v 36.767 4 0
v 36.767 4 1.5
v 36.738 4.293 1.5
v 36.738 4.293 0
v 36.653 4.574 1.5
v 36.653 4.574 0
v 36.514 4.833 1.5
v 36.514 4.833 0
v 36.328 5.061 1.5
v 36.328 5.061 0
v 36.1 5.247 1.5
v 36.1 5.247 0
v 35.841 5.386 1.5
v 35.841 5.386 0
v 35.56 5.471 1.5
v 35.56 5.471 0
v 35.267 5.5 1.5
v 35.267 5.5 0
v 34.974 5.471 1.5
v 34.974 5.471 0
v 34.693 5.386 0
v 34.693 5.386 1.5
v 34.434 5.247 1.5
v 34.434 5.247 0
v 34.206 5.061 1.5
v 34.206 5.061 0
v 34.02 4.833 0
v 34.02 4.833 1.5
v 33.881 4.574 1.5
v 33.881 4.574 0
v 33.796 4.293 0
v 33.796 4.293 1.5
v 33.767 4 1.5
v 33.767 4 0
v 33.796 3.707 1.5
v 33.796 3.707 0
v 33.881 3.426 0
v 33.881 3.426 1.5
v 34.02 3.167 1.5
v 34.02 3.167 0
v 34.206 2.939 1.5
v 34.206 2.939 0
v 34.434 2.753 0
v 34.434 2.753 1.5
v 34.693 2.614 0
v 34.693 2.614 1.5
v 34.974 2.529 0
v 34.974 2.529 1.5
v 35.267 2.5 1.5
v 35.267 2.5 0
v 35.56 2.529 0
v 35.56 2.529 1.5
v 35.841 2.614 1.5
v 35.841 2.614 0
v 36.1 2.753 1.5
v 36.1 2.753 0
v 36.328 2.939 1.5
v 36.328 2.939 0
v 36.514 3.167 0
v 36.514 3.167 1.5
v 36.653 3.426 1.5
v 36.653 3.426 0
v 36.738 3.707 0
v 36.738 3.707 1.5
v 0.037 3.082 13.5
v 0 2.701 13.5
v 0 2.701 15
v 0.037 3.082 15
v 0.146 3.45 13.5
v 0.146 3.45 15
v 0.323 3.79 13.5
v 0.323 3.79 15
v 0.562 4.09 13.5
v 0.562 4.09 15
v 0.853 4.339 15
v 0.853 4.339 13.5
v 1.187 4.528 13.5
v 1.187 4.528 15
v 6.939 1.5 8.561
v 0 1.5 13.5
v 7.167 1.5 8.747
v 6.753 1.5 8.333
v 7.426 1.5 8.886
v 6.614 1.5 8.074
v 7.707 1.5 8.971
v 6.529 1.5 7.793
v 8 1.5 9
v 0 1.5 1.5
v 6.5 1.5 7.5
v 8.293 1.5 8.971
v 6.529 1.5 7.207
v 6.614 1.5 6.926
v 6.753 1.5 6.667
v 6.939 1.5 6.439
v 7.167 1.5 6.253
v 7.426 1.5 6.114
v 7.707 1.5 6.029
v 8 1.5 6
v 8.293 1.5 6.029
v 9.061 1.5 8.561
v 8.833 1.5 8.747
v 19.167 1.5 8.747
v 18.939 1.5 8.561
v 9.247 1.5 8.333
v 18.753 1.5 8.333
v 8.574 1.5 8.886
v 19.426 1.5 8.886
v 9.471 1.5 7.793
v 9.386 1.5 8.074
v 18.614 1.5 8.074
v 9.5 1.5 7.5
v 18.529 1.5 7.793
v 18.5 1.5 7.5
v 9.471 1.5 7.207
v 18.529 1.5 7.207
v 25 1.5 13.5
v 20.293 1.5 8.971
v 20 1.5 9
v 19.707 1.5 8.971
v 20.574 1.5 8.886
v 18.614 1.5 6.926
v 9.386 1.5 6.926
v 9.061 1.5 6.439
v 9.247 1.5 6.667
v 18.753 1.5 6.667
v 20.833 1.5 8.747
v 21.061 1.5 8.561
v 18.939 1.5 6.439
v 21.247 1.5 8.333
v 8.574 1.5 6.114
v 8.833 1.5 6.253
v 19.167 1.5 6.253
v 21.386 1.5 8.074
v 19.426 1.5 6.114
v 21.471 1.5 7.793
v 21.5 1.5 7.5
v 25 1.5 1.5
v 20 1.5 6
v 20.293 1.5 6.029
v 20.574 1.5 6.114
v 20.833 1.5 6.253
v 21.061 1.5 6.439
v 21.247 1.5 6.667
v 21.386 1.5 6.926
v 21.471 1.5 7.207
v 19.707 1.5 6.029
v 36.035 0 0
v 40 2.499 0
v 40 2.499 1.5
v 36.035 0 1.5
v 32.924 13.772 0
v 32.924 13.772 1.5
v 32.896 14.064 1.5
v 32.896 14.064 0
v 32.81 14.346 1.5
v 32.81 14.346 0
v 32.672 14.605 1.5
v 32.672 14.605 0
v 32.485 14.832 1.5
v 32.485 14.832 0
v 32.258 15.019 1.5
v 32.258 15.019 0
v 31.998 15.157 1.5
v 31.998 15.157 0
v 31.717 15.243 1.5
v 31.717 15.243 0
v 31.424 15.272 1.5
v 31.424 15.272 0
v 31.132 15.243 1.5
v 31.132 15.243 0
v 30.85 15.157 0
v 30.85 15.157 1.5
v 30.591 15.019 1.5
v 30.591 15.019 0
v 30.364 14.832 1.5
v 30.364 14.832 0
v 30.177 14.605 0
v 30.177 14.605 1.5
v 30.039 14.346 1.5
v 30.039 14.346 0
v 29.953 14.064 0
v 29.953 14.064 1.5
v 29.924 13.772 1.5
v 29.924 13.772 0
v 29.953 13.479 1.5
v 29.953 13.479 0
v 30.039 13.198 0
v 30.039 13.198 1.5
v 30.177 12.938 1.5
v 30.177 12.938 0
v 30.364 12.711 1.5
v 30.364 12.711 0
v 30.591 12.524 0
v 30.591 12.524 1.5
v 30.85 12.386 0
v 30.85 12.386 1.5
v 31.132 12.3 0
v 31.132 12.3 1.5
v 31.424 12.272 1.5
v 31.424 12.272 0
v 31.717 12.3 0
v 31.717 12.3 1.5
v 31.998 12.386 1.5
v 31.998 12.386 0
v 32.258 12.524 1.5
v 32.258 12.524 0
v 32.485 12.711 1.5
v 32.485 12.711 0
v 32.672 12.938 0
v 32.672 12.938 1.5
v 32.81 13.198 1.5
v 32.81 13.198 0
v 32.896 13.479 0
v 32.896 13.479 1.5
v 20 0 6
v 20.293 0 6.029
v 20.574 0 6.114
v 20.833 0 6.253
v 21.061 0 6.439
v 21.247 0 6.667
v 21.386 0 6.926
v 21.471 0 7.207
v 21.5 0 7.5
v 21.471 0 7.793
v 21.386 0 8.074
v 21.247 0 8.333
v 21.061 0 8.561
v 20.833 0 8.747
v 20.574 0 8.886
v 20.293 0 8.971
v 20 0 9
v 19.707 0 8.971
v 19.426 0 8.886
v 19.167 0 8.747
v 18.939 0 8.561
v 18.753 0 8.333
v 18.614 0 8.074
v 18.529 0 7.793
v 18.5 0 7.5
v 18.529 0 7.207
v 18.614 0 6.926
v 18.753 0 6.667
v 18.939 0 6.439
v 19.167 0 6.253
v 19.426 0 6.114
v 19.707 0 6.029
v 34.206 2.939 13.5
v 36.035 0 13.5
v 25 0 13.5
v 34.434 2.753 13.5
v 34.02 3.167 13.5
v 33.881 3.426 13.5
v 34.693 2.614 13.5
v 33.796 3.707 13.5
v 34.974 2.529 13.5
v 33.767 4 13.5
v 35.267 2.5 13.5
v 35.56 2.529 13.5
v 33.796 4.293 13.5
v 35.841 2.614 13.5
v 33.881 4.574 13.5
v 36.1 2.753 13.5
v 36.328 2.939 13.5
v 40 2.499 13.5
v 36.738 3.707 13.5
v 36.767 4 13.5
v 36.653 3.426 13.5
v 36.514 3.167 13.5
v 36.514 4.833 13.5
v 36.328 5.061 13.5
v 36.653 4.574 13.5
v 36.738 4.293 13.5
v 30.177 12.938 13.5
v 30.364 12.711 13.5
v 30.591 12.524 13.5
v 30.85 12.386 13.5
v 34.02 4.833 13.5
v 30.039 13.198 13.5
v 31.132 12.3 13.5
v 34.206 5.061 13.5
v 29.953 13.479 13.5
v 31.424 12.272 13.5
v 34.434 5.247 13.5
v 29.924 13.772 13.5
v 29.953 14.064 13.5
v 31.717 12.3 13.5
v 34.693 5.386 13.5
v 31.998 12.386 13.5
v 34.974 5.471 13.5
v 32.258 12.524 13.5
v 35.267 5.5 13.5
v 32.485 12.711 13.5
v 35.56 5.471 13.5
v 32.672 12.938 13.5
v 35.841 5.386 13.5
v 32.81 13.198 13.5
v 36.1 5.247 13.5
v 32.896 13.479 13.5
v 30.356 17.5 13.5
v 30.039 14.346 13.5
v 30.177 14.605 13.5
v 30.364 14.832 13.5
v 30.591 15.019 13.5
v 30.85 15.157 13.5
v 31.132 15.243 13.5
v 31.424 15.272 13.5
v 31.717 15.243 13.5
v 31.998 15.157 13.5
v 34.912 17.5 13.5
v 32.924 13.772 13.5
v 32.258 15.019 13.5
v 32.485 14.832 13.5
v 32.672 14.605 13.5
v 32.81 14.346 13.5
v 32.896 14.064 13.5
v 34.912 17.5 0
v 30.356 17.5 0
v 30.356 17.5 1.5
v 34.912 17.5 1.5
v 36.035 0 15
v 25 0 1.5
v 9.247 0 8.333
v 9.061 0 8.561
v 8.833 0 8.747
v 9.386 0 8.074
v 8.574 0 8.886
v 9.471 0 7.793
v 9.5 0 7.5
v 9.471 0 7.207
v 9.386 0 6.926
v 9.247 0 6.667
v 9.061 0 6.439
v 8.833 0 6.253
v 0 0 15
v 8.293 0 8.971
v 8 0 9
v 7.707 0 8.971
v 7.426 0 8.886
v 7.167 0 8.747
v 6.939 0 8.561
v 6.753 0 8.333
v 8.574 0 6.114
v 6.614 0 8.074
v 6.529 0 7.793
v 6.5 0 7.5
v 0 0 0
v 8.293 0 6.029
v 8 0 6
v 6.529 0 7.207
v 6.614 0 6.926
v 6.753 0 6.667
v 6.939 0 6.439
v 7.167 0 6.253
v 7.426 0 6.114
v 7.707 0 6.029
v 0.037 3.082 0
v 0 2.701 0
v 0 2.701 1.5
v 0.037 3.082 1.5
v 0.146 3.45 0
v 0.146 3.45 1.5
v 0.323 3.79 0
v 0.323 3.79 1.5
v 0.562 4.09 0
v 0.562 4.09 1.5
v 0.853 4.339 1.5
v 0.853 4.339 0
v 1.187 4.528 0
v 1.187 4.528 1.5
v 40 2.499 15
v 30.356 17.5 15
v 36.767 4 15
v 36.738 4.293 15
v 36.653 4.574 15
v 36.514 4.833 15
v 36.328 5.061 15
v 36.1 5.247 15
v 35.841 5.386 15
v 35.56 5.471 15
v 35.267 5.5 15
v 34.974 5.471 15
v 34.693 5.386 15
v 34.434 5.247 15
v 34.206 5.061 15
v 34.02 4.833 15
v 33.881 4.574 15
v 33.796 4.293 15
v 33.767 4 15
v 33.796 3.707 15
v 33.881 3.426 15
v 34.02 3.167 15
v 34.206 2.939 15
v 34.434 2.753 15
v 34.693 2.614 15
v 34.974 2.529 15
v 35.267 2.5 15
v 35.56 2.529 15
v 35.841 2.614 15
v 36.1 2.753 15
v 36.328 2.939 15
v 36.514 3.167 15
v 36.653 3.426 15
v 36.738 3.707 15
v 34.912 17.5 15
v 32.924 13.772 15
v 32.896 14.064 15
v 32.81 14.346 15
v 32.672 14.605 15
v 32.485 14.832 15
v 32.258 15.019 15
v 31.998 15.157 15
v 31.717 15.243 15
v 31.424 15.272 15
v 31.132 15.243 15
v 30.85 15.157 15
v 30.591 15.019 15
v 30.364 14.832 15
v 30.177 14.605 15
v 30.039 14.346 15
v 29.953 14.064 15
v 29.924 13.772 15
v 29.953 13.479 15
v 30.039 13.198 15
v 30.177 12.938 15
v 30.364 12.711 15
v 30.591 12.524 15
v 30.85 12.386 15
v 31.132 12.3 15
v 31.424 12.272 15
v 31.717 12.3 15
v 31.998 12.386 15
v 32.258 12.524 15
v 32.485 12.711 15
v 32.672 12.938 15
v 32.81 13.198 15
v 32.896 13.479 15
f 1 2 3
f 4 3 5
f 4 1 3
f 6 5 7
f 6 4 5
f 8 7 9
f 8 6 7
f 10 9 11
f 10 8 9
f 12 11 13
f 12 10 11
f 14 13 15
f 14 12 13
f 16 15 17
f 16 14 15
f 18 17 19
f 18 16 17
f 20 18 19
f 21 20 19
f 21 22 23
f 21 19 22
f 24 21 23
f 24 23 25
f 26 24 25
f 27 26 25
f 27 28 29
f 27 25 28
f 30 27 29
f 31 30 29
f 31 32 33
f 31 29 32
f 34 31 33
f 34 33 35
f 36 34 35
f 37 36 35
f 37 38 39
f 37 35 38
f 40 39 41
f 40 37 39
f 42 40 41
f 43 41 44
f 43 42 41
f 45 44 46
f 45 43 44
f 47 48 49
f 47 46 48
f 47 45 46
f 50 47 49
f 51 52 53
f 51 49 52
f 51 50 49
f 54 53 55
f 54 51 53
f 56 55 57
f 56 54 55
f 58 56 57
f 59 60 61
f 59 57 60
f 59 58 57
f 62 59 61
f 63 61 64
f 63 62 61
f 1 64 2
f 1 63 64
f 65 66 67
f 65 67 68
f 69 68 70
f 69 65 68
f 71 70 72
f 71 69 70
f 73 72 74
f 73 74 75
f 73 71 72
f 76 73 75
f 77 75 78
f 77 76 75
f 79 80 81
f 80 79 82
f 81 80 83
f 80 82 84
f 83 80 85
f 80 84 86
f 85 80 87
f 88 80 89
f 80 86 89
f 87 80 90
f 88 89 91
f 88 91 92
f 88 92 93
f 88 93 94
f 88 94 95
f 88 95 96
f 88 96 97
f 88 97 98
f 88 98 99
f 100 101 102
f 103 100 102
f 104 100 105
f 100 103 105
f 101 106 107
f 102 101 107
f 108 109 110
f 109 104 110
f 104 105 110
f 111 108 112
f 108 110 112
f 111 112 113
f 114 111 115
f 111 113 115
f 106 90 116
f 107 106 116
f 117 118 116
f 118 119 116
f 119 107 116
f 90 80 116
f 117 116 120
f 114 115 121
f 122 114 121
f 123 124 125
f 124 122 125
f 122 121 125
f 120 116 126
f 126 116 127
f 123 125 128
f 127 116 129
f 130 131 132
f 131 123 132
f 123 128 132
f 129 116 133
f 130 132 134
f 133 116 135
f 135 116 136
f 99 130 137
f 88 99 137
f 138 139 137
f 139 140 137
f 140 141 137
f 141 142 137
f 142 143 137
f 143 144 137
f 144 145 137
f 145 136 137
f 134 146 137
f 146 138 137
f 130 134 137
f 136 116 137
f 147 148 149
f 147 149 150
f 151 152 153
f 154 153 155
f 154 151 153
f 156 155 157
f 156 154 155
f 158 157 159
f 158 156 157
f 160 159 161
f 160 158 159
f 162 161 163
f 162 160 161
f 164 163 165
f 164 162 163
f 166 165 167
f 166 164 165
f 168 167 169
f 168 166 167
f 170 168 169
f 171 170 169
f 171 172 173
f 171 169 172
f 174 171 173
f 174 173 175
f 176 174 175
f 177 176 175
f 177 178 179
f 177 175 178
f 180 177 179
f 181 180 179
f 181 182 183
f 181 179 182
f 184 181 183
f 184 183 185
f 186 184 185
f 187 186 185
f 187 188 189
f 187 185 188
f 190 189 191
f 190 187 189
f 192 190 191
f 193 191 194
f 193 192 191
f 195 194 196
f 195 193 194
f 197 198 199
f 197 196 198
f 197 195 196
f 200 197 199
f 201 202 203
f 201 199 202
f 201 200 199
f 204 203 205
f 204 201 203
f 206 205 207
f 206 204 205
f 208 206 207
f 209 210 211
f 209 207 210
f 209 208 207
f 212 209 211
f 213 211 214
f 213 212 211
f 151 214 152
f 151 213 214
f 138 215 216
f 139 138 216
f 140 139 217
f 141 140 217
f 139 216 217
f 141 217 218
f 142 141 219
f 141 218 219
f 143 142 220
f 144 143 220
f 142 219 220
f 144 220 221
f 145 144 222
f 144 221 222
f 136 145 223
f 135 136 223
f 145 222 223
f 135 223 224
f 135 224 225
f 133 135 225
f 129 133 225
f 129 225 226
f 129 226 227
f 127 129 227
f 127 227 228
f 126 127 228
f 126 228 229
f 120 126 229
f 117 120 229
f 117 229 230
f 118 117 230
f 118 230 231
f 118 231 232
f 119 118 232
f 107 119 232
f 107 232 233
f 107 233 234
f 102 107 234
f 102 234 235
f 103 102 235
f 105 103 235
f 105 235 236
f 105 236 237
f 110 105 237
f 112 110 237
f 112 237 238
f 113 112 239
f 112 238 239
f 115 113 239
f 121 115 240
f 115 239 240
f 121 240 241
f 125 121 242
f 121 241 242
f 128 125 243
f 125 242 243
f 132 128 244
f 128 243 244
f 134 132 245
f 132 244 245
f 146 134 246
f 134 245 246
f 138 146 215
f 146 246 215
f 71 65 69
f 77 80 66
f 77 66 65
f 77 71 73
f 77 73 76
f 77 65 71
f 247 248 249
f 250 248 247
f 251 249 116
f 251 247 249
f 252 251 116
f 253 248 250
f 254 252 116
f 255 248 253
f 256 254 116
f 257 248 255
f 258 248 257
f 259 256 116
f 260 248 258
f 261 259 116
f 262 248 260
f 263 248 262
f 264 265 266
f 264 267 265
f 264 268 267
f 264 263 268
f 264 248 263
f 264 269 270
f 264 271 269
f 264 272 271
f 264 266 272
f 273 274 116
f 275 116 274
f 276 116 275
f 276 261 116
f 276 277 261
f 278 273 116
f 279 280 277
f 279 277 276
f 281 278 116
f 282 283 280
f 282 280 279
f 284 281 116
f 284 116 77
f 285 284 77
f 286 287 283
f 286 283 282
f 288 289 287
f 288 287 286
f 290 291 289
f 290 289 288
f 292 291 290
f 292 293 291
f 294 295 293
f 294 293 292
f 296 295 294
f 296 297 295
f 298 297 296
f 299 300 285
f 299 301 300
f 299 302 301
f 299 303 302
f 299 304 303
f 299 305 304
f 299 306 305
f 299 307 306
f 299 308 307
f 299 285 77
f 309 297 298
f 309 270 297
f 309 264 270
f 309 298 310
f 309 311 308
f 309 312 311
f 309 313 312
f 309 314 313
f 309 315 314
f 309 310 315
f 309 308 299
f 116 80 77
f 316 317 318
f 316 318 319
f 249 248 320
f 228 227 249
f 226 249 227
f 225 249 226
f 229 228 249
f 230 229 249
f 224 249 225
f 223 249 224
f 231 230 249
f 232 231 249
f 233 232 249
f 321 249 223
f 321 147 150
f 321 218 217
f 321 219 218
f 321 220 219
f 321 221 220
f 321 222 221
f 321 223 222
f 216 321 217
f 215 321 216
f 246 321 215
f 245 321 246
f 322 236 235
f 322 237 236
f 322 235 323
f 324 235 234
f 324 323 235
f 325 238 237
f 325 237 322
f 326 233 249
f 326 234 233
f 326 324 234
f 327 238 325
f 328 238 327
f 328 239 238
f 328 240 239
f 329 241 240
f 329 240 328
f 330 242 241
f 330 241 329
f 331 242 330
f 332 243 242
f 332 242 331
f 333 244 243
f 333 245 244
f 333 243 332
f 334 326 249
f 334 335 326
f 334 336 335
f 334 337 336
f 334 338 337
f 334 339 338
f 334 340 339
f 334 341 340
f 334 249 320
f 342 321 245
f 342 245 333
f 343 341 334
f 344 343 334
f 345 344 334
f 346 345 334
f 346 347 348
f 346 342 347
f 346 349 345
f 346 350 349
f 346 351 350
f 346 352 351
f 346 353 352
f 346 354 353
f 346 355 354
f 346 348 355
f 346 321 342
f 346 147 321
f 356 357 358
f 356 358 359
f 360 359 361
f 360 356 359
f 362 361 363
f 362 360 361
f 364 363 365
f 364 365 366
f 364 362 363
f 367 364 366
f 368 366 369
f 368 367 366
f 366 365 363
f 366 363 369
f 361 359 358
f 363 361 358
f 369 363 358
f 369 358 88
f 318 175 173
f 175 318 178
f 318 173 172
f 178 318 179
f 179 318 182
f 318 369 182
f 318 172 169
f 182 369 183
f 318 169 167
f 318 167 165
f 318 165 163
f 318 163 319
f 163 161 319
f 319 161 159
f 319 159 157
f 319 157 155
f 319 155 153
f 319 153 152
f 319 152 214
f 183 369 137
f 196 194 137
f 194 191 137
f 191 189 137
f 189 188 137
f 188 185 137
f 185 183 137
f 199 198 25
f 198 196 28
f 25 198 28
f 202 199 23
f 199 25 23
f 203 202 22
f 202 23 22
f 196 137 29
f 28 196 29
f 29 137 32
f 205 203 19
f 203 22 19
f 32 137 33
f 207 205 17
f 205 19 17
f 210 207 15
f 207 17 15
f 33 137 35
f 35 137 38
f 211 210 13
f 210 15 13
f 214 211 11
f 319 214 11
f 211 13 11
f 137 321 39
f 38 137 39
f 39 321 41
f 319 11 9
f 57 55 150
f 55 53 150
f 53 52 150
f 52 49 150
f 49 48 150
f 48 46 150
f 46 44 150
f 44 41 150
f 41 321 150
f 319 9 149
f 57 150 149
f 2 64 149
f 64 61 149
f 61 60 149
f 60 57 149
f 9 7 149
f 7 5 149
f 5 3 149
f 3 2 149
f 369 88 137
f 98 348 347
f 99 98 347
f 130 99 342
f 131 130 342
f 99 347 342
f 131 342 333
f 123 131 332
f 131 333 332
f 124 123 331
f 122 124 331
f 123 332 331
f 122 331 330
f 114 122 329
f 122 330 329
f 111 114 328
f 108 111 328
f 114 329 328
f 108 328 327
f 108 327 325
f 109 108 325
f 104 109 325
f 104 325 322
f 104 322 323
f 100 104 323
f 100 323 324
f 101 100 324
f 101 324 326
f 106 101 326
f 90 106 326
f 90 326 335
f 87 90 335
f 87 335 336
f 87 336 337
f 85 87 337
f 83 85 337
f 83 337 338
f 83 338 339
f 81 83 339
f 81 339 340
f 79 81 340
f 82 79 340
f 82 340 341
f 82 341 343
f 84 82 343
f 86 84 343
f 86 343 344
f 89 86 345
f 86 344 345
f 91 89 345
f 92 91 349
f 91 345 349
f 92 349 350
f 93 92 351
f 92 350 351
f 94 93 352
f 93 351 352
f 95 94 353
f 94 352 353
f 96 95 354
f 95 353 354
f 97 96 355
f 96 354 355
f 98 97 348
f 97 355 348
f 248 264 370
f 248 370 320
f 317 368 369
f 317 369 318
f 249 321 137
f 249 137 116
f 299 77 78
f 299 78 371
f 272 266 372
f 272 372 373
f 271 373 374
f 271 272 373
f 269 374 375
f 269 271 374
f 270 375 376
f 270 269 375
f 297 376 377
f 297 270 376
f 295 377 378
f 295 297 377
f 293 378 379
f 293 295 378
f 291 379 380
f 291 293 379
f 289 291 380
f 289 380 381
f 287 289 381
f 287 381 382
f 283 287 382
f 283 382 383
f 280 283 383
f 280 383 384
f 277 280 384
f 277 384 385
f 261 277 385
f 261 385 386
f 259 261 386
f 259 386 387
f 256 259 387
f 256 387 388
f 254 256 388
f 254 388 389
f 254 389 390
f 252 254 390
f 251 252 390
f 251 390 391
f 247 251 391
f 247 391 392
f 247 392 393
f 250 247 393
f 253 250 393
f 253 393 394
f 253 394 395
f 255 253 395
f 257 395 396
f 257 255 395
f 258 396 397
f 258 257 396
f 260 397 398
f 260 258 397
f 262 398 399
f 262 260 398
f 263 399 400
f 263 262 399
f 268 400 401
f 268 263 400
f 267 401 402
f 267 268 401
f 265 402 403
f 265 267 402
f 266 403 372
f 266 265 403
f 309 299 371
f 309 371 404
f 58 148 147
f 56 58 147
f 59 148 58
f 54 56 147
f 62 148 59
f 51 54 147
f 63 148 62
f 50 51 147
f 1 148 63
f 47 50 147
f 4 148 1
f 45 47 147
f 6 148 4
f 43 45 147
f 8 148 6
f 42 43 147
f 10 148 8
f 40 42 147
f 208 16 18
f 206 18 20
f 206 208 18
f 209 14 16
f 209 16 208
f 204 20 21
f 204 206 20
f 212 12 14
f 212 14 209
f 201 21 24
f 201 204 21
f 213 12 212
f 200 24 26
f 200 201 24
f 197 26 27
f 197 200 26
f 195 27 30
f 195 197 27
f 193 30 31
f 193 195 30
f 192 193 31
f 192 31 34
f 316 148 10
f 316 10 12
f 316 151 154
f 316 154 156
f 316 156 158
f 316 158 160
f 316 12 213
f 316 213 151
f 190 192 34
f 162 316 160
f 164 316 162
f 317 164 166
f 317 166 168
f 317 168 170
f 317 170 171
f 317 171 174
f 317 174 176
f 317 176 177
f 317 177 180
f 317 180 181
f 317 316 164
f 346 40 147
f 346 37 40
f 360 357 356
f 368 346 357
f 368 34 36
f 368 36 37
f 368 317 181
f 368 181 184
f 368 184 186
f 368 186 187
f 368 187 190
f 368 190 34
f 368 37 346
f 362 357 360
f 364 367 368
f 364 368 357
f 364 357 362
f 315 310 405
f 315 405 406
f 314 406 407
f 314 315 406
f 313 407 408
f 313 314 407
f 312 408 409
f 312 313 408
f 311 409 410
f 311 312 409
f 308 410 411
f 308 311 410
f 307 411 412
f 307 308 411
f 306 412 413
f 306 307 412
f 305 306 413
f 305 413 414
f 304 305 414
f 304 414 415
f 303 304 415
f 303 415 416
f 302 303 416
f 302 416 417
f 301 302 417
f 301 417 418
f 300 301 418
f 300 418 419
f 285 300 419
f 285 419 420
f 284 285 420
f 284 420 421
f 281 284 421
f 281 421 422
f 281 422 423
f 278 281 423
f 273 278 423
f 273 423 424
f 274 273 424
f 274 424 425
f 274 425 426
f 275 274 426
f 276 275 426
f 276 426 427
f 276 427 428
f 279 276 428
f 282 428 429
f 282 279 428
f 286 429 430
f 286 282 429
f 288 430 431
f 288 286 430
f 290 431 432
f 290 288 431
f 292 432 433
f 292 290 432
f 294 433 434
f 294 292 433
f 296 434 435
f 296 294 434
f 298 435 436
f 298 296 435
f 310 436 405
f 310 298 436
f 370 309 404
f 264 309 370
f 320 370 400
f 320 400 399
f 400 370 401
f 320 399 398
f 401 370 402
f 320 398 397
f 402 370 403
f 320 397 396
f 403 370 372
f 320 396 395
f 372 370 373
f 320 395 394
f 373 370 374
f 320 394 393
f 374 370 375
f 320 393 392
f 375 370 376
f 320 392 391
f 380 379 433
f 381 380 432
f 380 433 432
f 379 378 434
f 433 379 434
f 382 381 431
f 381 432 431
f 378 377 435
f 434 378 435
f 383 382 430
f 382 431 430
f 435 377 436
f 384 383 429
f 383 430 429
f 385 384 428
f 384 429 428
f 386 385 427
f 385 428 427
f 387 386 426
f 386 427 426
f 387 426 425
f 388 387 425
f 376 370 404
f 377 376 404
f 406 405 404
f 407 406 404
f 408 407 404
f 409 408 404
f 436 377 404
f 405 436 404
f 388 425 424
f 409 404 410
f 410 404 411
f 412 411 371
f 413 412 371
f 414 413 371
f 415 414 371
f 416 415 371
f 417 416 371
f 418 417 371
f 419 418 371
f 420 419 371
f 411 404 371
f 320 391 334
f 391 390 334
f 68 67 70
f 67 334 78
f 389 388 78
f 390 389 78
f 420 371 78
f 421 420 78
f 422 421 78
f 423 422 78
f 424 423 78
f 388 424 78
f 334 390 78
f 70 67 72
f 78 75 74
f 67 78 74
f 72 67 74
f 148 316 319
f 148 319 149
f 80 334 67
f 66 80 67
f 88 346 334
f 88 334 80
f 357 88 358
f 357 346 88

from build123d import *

# Parameters (mm, degrees)
SKETCH_1_R          = 1.5
EXTRUDE_1_DEPTH     = 15
SKETCH_2_W          = 21.498069498
SKETCH_2_H          = 12
CUT_EXTRUDE_1_DEPTH = 50
SKETCH_3_W          = 12
SKETCH_3_H          = 16
CUT_EXTRUDE_2_DEPTH = 50
SKETCH_4_R          = 1.5
CUT_EXTRUDE_3_DEPTH = 50


with BuildPart() as part:
    # Эскиз1 → Вытянуть1 (new body)
    with BuildSketch(Plane.XY):
        with BuildLine():
            Line((1.187295832, 4.528019462), (30.355876768, 17.5))
            Line((30.355876768, 17.5), (34.911631679, 17.5))
            Line((34.911631679, 17.5), (40, 2.498964042))
            Line((40, 2.498964042), (36.034968506, 0))
            Line((36.034968506, 0), (0, 0))
            Line((0, 0), (0, 2.700586308))
            ThreePointArc((0, 2.700586308), (0.322888147, 3.790217361), (1.187295832, 4.528019462))
        make_face()
        with Locations((35.266995766, 4)):
            Circle(SKETCH_1_R, mode=Mode.SUBTRACT)
        with Locations((31.42446315, 13.771639734)):
            Circle(SKETCH_1_R, mode=Mode.SUBTRACT)
    extrude(amount=EXTRUDE_1_DEPTH)

    # Эскиз2 → Вырез-Вытянуть1 (cut)
    with BuildSketch(Plane.XZ):
        with Locations((35.749034749, 7.5)):
            Rectangle(SKETCH_2_W, SKETCH_2_H)
    extrude(amount=-CUT_EXTRUDE_1_DEPTH, mode=Mode.SUBTRACT)

    # Эскиз3 → Вырез-Вытянуть2 (cut)
    with BuildSketch(Plane(origin=(25, 0, 0), x_dir=(0, 0, -1), z_dir=(1, 0, 0))):
        with Locations((-7.5, 9.5)):
            Rectangle(SKETCH_3_W, SKETCH_3_H)
    extrude(amount=-CUT_EXTRUDE_2_DEPTH, mode=Mode.SUBTRACT)

    # Эскиз4 → Вырез-Вытянуть3 (cut)
    with BuildSketch(Plane.XZ):
        with Locations(Location((8, 7.5, 0), (0, 0, 270))):
            Circle(SKETCH_4_R)
        with Locations(Location((20, 7.5, 0), (0, 0, 270))):
            Circle(SKETCH_4_R)
    extrude(amount=-CUT_EXTRUDE_3_DEPTH, mode=Mode.SUBTRACT)


solid = part.part
